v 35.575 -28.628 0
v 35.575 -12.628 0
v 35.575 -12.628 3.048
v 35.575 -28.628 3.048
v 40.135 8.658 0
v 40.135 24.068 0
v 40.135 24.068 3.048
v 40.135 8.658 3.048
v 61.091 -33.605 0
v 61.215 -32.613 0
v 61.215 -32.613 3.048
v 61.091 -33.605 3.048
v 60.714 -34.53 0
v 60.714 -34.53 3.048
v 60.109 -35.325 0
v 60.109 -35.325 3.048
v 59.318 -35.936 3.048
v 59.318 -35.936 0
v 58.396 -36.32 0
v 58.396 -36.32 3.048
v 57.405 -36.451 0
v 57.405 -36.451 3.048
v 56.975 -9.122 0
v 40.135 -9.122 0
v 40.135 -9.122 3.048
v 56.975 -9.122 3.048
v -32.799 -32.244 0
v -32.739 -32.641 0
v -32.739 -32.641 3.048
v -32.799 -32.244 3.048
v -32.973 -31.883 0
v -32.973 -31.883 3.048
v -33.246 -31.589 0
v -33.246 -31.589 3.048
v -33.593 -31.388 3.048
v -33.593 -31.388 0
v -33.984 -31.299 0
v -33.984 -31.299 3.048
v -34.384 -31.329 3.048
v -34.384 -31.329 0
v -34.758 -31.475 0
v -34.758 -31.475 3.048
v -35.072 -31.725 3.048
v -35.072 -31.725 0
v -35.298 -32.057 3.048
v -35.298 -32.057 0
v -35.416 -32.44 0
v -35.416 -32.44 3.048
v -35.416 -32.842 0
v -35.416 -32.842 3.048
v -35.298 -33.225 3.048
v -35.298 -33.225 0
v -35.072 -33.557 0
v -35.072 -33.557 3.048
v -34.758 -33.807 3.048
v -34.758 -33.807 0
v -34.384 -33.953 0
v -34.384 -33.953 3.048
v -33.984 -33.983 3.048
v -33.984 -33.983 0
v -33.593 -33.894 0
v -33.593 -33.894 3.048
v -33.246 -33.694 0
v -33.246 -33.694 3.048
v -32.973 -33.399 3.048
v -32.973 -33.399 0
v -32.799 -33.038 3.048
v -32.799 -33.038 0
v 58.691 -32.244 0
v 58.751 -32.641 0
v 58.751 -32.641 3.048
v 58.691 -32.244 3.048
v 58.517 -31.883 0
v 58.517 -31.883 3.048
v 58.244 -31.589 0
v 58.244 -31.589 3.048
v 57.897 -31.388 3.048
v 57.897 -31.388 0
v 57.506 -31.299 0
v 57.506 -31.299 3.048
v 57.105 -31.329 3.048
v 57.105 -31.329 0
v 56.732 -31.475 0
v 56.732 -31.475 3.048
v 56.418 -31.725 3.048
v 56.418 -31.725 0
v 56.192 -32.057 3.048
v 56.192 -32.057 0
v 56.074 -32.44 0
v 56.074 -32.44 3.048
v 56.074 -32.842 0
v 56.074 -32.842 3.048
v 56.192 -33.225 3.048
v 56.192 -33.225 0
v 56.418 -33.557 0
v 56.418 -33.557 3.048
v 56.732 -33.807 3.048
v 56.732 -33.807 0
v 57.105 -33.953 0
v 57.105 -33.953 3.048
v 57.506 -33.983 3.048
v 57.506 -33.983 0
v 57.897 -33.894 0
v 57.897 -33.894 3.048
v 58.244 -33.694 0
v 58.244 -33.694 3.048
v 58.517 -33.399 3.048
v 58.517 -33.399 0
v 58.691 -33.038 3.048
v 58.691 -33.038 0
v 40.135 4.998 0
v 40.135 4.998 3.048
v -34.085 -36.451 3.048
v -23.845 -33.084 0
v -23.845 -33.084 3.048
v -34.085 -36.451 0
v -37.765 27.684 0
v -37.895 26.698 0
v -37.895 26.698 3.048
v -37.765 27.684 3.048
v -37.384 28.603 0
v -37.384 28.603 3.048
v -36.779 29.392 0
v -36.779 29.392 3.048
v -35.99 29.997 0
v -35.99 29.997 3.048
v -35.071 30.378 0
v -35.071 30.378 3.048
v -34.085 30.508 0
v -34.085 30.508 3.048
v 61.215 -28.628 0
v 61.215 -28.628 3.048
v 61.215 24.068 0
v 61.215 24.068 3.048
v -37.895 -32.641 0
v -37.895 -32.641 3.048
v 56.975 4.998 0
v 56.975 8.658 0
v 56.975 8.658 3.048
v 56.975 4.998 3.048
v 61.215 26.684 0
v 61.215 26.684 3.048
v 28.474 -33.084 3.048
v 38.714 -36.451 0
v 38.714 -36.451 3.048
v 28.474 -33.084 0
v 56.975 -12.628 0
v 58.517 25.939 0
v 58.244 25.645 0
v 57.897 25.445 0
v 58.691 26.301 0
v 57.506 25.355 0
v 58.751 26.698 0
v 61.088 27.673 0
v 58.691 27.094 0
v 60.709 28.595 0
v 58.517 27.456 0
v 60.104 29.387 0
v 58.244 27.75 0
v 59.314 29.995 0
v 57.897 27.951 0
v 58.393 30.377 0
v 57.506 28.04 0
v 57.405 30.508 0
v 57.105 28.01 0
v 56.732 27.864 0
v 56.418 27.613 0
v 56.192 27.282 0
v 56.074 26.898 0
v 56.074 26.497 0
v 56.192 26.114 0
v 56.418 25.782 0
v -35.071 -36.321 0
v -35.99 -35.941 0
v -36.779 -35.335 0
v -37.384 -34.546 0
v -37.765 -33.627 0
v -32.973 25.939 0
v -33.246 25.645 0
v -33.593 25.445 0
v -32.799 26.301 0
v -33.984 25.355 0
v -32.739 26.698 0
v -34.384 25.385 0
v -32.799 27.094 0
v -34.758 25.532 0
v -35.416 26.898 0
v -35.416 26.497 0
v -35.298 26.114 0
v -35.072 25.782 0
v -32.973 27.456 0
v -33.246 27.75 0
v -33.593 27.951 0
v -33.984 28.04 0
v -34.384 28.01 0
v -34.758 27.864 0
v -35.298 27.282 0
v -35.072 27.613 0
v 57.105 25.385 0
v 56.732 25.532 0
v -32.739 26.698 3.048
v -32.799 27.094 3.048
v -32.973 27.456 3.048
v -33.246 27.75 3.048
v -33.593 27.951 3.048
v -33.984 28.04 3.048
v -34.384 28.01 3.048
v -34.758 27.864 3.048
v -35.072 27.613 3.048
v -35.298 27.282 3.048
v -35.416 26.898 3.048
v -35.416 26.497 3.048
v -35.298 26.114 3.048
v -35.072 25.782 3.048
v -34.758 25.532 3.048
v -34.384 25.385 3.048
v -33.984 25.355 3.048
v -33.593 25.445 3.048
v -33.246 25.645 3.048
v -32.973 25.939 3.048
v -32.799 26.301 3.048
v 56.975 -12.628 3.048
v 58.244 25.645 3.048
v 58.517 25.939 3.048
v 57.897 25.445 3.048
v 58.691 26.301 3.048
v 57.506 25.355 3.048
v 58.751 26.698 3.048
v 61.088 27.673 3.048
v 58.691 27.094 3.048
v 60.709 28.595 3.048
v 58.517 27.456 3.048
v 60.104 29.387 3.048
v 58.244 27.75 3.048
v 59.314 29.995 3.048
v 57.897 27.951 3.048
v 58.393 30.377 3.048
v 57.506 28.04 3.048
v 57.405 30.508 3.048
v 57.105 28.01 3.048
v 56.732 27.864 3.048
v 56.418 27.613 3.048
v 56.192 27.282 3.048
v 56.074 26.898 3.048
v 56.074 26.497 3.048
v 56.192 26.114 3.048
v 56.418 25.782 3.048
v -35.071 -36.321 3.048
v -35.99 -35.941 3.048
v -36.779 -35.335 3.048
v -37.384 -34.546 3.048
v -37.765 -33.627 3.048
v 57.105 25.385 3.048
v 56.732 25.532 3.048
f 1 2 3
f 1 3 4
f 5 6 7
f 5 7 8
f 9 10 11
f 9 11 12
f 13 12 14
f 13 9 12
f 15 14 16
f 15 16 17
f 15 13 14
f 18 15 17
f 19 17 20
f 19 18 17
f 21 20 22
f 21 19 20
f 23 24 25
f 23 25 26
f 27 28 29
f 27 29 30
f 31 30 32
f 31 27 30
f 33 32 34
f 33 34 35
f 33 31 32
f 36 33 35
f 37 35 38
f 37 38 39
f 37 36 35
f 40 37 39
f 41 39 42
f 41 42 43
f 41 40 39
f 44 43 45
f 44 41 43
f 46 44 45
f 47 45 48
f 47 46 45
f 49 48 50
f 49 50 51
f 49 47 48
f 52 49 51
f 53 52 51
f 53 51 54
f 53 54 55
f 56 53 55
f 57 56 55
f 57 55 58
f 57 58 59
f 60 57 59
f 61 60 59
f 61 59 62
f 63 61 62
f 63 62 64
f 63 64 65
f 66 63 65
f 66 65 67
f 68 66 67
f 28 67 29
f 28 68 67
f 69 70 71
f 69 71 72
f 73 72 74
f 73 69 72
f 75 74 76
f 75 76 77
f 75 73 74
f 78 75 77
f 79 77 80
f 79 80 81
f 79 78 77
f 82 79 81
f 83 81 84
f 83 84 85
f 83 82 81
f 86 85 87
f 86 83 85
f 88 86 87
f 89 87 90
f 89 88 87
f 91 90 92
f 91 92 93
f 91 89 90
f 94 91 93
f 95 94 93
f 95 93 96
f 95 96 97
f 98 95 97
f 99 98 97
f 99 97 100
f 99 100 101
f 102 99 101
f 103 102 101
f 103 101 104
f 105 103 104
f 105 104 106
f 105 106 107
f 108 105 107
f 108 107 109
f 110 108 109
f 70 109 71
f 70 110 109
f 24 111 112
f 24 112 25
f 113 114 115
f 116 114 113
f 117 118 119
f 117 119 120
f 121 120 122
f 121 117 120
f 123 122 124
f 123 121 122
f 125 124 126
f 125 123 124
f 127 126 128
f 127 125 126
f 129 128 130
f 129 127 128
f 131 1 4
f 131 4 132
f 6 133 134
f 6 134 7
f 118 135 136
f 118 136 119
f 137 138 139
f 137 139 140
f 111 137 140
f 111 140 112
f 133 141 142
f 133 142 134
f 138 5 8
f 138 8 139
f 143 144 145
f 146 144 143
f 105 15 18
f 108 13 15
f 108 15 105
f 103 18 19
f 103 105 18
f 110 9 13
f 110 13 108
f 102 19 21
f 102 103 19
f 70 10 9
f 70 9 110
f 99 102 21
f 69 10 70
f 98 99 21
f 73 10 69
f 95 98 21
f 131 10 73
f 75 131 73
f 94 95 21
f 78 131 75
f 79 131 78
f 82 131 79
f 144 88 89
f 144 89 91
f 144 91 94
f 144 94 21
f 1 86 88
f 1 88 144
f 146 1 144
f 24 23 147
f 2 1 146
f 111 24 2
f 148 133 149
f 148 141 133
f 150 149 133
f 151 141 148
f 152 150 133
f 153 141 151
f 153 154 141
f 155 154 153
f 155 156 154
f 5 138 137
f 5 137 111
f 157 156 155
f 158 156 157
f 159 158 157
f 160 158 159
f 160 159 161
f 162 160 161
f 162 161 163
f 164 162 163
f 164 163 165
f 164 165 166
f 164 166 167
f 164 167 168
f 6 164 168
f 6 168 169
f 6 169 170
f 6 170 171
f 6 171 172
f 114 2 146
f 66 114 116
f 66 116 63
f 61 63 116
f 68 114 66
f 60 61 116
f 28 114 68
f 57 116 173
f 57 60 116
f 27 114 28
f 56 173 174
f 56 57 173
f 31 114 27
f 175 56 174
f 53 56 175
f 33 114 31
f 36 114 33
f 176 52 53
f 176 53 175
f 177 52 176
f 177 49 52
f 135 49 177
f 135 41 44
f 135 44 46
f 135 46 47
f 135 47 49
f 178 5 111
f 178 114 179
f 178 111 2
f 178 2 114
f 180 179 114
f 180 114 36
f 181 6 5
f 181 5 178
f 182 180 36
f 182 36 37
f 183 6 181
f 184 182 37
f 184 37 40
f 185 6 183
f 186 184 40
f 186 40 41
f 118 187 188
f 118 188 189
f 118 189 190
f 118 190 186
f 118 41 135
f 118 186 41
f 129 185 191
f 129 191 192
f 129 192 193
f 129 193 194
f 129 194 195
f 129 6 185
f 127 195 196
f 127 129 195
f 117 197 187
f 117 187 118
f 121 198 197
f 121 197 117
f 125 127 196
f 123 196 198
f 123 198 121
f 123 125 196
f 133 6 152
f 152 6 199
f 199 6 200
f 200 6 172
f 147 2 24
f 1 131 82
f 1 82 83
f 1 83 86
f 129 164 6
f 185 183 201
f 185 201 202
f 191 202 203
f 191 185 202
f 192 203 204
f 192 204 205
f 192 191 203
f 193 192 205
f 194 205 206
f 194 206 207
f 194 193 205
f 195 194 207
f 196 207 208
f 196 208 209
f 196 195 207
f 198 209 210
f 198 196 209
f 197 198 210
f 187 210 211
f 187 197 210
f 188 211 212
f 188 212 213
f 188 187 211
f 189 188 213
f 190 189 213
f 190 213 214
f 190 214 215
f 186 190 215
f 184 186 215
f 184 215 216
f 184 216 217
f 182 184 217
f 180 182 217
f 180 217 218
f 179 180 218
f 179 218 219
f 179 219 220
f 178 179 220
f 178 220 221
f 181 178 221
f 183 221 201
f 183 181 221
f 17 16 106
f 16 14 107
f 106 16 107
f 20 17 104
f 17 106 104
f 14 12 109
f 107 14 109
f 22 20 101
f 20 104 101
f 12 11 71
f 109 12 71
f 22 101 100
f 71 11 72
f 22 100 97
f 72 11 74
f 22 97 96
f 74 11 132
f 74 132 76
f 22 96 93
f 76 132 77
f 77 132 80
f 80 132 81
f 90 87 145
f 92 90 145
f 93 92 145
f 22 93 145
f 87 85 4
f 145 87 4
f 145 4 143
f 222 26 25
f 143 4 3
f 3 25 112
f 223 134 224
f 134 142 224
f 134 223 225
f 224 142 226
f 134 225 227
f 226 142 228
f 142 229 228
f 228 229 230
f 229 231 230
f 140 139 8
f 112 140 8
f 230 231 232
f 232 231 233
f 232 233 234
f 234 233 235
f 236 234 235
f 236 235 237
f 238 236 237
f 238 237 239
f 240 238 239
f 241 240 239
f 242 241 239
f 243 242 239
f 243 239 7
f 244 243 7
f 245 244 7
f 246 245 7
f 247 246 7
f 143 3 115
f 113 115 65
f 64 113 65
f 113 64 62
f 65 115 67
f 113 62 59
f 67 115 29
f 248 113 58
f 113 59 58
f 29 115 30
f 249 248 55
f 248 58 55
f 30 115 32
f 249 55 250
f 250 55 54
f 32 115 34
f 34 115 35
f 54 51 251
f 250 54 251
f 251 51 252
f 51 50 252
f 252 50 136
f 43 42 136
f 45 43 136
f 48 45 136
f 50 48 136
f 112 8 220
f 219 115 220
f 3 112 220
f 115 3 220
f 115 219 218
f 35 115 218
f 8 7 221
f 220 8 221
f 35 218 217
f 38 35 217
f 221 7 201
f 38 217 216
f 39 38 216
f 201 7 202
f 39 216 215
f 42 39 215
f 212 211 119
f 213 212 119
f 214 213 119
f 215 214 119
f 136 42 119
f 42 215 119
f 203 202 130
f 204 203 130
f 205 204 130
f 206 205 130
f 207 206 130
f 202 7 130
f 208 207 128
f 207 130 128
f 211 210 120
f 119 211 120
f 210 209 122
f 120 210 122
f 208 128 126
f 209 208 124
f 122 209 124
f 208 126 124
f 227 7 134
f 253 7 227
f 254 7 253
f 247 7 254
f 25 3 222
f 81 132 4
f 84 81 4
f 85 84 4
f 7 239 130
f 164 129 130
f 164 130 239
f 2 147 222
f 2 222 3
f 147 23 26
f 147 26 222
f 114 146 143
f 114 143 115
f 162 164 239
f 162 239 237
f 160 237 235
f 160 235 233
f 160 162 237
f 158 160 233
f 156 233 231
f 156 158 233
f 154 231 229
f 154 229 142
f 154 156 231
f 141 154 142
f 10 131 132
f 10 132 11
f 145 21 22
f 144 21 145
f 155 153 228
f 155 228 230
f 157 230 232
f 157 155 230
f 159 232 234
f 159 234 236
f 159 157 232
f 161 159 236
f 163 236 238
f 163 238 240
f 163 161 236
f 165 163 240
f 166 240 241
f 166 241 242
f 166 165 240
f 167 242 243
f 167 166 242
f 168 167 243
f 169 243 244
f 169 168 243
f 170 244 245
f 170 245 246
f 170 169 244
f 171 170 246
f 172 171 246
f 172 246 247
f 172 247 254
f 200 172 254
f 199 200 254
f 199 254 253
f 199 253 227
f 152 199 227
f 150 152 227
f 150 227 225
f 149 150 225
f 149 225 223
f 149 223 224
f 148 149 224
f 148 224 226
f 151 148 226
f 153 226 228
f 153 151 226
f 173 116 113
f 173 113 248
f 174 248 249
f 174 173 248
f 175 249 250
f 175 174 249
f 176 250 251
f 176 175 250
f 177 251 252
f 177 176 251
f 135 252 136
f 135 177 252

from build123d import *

# Parameters (mm, degrees)
SKETCH1_R           = 1.3462
SKETCH1_W           = 60.6932
SKETCH1_H           = 7.81
SKETCH1_W_2         = 5.588
SKETCH1_H_2         = 23.368
SKETCH1_W_3         = 5.4034
SKETCH1_H_3         = 22.6066
BOSS_EXTRUDE1_DEPTH = 3.048
SKETCH2_R           = 10.922
SKETCH2_R_2         = 1.4986
CUT_EXTRUDE1_DEPTH  = 4.048
SKETCH3_W           = 60.6932
SKETCH3_H           = 56.8638
BOSS_EXTRUDE2_DEPTH = 3.048


with BuildPart() as part:
    # Sketch1 → Boss-Extrude1 (new body)
    with BuildSketch(Plane.XY):
        with BuildLine():
            Line((61.214907375, 24.068294304), (40.134807375, 24.068294304))
            Line((40.134807375, 24.068294304), (40.134807375, 8.658194304))
            Line((40.134807375, 8.658194304), (56.975007375, 8.658194304))
            Line((56.975007375, 8.658194304), (56.975007375, 4.997894304))
            Line((56.975007375, 4.997894304), (40.134807375, 4.997894304))
            Line((40.134807375, 4.997894304), (40.134807375, -9.121805696))
            Line((40.134807375, -9.121805696), (56.975007375, -9.121805696))
            Line((56.975007375, -9.121805696), (56.975007375, -12.628005696))
            Line((56.975007375, -12.628005696), (35.575007375, -12.628005696))
            Line((35.575007375, -12.628005696), (35.575007375, -28.627805696))
            Line((35.575007375, -28.627805696), (61.214907375, -28.627805696))
            Line((61.214907375, -28.627805696), (61.214907375, -32.613401529))
            ThreePointArc((61.214907375, -32.613401529), (60.108826144, -35.325305244), (57.405007375, -36.451005696))
            Line((57.405007375, -36.451005696), (38.714307375, -36.451005696))
            Line((38.714307375, -36.451005696), (28.474307375, -33.084405696))
            Line((28.474307375, -33.084405696), (-23.844892625, -33.084405696))
            Line((-23.844892625, -33.084405696), (-34.084892625, -36.451005696))
            ThreePointArc((-34.084892625, -36.451005696), (-36.778969461, -35.335082532), (-37.894892625, -32.641005696))
            Line((-37.894892625, -32.641005696), (-37.894892625, 26.697694304))
            ThreePointArc((-37.894892625, 26.697694304), (-36.778969461, 29.391771141), (-34.084892625, 30.507694304))
            Line((-34.084892625, 30.507694304), (57.404932375, 30.507694304))
            ThreePointArc((57.404932375, 30.507694304), (60.103884597, 29.386886916), (61.214907375, 26.683892153))
            Line((61.214907375, 26.683892153), (61.214907375, 24.068294304))
        make_face()
        with Locations((57.404932375, 26.697694304)):
            Circle(SKETCH1_R, mode=Mode.SUBTRACT)
        with Locations((-34.084892625, 26.697694304)):
            Circle(SKETCH1_R, mode=Mode.SUBTRACT)
        with Locations((-34.084892625, -32.641005696)):
            Circle(SKETCH1_R, mode=Mode.SUBTRACT)
        with Locations((57.405007375, -32.641005696)):
            Circle(SKETCH1_R, mode=Mode.SUBTRACT)
        with Locations((1.341707375, 21.991994304)):
            Rectangle(SKETCH1_W, SKETCH1_H, mode=Mode.SUBTRACT)
        with Locations((-26.210892625, -1.882805696)):
            Rectangle(SKETCH1_W_2, SKETCH1_H_2, mode=Mode.SUBTRACT)
        with Locations((16.546707375, -19.663505696)):
            Rectangle(SKETCH1_W_3, SKETCH1_H_3, mode=Mode.SUBTRACT)
    extrude(amount=BOSS_EXTRUDE1_DEPTH)

    # Sketch2 → Cut-Extrude1 (cut, through all)
    with BuildSketch(Plane.XY.offset(3.048)):
        with Locations((-0.302892625, -0.480305696)):
            Circle(SKETCH2_R)
        with Locations((-10.285092625, -10.462505696)):
            Circle(SKETCH2_R_2)
        with Locations((-10.285092625, 9.501894304)):
            Circle(SKETCH2_R_2)
        with Locations((9.679307375, -10.462505696)):
            Circle(SKETCH2_R_2)
        with Locations((9.679307375, 9.501894304)):
            Circle(SKETCH2_R_2)
    extrude(amount=-CUT_EXTRUDE1_DEPTH, mode=Mode.SUBTRACT)

    # Sketch3 → Boss-Extrude2 (add)
    with BuildSketch(Plane.XY.offset(3.048)):
        with Locations((1.341707375, -2.534905696)):
            Rectangle(SKETCH3_W, SKETCH3_H)
    extrude(amount=-BOSS_EXTRUDE2_DEPTH)


solid = part.part
